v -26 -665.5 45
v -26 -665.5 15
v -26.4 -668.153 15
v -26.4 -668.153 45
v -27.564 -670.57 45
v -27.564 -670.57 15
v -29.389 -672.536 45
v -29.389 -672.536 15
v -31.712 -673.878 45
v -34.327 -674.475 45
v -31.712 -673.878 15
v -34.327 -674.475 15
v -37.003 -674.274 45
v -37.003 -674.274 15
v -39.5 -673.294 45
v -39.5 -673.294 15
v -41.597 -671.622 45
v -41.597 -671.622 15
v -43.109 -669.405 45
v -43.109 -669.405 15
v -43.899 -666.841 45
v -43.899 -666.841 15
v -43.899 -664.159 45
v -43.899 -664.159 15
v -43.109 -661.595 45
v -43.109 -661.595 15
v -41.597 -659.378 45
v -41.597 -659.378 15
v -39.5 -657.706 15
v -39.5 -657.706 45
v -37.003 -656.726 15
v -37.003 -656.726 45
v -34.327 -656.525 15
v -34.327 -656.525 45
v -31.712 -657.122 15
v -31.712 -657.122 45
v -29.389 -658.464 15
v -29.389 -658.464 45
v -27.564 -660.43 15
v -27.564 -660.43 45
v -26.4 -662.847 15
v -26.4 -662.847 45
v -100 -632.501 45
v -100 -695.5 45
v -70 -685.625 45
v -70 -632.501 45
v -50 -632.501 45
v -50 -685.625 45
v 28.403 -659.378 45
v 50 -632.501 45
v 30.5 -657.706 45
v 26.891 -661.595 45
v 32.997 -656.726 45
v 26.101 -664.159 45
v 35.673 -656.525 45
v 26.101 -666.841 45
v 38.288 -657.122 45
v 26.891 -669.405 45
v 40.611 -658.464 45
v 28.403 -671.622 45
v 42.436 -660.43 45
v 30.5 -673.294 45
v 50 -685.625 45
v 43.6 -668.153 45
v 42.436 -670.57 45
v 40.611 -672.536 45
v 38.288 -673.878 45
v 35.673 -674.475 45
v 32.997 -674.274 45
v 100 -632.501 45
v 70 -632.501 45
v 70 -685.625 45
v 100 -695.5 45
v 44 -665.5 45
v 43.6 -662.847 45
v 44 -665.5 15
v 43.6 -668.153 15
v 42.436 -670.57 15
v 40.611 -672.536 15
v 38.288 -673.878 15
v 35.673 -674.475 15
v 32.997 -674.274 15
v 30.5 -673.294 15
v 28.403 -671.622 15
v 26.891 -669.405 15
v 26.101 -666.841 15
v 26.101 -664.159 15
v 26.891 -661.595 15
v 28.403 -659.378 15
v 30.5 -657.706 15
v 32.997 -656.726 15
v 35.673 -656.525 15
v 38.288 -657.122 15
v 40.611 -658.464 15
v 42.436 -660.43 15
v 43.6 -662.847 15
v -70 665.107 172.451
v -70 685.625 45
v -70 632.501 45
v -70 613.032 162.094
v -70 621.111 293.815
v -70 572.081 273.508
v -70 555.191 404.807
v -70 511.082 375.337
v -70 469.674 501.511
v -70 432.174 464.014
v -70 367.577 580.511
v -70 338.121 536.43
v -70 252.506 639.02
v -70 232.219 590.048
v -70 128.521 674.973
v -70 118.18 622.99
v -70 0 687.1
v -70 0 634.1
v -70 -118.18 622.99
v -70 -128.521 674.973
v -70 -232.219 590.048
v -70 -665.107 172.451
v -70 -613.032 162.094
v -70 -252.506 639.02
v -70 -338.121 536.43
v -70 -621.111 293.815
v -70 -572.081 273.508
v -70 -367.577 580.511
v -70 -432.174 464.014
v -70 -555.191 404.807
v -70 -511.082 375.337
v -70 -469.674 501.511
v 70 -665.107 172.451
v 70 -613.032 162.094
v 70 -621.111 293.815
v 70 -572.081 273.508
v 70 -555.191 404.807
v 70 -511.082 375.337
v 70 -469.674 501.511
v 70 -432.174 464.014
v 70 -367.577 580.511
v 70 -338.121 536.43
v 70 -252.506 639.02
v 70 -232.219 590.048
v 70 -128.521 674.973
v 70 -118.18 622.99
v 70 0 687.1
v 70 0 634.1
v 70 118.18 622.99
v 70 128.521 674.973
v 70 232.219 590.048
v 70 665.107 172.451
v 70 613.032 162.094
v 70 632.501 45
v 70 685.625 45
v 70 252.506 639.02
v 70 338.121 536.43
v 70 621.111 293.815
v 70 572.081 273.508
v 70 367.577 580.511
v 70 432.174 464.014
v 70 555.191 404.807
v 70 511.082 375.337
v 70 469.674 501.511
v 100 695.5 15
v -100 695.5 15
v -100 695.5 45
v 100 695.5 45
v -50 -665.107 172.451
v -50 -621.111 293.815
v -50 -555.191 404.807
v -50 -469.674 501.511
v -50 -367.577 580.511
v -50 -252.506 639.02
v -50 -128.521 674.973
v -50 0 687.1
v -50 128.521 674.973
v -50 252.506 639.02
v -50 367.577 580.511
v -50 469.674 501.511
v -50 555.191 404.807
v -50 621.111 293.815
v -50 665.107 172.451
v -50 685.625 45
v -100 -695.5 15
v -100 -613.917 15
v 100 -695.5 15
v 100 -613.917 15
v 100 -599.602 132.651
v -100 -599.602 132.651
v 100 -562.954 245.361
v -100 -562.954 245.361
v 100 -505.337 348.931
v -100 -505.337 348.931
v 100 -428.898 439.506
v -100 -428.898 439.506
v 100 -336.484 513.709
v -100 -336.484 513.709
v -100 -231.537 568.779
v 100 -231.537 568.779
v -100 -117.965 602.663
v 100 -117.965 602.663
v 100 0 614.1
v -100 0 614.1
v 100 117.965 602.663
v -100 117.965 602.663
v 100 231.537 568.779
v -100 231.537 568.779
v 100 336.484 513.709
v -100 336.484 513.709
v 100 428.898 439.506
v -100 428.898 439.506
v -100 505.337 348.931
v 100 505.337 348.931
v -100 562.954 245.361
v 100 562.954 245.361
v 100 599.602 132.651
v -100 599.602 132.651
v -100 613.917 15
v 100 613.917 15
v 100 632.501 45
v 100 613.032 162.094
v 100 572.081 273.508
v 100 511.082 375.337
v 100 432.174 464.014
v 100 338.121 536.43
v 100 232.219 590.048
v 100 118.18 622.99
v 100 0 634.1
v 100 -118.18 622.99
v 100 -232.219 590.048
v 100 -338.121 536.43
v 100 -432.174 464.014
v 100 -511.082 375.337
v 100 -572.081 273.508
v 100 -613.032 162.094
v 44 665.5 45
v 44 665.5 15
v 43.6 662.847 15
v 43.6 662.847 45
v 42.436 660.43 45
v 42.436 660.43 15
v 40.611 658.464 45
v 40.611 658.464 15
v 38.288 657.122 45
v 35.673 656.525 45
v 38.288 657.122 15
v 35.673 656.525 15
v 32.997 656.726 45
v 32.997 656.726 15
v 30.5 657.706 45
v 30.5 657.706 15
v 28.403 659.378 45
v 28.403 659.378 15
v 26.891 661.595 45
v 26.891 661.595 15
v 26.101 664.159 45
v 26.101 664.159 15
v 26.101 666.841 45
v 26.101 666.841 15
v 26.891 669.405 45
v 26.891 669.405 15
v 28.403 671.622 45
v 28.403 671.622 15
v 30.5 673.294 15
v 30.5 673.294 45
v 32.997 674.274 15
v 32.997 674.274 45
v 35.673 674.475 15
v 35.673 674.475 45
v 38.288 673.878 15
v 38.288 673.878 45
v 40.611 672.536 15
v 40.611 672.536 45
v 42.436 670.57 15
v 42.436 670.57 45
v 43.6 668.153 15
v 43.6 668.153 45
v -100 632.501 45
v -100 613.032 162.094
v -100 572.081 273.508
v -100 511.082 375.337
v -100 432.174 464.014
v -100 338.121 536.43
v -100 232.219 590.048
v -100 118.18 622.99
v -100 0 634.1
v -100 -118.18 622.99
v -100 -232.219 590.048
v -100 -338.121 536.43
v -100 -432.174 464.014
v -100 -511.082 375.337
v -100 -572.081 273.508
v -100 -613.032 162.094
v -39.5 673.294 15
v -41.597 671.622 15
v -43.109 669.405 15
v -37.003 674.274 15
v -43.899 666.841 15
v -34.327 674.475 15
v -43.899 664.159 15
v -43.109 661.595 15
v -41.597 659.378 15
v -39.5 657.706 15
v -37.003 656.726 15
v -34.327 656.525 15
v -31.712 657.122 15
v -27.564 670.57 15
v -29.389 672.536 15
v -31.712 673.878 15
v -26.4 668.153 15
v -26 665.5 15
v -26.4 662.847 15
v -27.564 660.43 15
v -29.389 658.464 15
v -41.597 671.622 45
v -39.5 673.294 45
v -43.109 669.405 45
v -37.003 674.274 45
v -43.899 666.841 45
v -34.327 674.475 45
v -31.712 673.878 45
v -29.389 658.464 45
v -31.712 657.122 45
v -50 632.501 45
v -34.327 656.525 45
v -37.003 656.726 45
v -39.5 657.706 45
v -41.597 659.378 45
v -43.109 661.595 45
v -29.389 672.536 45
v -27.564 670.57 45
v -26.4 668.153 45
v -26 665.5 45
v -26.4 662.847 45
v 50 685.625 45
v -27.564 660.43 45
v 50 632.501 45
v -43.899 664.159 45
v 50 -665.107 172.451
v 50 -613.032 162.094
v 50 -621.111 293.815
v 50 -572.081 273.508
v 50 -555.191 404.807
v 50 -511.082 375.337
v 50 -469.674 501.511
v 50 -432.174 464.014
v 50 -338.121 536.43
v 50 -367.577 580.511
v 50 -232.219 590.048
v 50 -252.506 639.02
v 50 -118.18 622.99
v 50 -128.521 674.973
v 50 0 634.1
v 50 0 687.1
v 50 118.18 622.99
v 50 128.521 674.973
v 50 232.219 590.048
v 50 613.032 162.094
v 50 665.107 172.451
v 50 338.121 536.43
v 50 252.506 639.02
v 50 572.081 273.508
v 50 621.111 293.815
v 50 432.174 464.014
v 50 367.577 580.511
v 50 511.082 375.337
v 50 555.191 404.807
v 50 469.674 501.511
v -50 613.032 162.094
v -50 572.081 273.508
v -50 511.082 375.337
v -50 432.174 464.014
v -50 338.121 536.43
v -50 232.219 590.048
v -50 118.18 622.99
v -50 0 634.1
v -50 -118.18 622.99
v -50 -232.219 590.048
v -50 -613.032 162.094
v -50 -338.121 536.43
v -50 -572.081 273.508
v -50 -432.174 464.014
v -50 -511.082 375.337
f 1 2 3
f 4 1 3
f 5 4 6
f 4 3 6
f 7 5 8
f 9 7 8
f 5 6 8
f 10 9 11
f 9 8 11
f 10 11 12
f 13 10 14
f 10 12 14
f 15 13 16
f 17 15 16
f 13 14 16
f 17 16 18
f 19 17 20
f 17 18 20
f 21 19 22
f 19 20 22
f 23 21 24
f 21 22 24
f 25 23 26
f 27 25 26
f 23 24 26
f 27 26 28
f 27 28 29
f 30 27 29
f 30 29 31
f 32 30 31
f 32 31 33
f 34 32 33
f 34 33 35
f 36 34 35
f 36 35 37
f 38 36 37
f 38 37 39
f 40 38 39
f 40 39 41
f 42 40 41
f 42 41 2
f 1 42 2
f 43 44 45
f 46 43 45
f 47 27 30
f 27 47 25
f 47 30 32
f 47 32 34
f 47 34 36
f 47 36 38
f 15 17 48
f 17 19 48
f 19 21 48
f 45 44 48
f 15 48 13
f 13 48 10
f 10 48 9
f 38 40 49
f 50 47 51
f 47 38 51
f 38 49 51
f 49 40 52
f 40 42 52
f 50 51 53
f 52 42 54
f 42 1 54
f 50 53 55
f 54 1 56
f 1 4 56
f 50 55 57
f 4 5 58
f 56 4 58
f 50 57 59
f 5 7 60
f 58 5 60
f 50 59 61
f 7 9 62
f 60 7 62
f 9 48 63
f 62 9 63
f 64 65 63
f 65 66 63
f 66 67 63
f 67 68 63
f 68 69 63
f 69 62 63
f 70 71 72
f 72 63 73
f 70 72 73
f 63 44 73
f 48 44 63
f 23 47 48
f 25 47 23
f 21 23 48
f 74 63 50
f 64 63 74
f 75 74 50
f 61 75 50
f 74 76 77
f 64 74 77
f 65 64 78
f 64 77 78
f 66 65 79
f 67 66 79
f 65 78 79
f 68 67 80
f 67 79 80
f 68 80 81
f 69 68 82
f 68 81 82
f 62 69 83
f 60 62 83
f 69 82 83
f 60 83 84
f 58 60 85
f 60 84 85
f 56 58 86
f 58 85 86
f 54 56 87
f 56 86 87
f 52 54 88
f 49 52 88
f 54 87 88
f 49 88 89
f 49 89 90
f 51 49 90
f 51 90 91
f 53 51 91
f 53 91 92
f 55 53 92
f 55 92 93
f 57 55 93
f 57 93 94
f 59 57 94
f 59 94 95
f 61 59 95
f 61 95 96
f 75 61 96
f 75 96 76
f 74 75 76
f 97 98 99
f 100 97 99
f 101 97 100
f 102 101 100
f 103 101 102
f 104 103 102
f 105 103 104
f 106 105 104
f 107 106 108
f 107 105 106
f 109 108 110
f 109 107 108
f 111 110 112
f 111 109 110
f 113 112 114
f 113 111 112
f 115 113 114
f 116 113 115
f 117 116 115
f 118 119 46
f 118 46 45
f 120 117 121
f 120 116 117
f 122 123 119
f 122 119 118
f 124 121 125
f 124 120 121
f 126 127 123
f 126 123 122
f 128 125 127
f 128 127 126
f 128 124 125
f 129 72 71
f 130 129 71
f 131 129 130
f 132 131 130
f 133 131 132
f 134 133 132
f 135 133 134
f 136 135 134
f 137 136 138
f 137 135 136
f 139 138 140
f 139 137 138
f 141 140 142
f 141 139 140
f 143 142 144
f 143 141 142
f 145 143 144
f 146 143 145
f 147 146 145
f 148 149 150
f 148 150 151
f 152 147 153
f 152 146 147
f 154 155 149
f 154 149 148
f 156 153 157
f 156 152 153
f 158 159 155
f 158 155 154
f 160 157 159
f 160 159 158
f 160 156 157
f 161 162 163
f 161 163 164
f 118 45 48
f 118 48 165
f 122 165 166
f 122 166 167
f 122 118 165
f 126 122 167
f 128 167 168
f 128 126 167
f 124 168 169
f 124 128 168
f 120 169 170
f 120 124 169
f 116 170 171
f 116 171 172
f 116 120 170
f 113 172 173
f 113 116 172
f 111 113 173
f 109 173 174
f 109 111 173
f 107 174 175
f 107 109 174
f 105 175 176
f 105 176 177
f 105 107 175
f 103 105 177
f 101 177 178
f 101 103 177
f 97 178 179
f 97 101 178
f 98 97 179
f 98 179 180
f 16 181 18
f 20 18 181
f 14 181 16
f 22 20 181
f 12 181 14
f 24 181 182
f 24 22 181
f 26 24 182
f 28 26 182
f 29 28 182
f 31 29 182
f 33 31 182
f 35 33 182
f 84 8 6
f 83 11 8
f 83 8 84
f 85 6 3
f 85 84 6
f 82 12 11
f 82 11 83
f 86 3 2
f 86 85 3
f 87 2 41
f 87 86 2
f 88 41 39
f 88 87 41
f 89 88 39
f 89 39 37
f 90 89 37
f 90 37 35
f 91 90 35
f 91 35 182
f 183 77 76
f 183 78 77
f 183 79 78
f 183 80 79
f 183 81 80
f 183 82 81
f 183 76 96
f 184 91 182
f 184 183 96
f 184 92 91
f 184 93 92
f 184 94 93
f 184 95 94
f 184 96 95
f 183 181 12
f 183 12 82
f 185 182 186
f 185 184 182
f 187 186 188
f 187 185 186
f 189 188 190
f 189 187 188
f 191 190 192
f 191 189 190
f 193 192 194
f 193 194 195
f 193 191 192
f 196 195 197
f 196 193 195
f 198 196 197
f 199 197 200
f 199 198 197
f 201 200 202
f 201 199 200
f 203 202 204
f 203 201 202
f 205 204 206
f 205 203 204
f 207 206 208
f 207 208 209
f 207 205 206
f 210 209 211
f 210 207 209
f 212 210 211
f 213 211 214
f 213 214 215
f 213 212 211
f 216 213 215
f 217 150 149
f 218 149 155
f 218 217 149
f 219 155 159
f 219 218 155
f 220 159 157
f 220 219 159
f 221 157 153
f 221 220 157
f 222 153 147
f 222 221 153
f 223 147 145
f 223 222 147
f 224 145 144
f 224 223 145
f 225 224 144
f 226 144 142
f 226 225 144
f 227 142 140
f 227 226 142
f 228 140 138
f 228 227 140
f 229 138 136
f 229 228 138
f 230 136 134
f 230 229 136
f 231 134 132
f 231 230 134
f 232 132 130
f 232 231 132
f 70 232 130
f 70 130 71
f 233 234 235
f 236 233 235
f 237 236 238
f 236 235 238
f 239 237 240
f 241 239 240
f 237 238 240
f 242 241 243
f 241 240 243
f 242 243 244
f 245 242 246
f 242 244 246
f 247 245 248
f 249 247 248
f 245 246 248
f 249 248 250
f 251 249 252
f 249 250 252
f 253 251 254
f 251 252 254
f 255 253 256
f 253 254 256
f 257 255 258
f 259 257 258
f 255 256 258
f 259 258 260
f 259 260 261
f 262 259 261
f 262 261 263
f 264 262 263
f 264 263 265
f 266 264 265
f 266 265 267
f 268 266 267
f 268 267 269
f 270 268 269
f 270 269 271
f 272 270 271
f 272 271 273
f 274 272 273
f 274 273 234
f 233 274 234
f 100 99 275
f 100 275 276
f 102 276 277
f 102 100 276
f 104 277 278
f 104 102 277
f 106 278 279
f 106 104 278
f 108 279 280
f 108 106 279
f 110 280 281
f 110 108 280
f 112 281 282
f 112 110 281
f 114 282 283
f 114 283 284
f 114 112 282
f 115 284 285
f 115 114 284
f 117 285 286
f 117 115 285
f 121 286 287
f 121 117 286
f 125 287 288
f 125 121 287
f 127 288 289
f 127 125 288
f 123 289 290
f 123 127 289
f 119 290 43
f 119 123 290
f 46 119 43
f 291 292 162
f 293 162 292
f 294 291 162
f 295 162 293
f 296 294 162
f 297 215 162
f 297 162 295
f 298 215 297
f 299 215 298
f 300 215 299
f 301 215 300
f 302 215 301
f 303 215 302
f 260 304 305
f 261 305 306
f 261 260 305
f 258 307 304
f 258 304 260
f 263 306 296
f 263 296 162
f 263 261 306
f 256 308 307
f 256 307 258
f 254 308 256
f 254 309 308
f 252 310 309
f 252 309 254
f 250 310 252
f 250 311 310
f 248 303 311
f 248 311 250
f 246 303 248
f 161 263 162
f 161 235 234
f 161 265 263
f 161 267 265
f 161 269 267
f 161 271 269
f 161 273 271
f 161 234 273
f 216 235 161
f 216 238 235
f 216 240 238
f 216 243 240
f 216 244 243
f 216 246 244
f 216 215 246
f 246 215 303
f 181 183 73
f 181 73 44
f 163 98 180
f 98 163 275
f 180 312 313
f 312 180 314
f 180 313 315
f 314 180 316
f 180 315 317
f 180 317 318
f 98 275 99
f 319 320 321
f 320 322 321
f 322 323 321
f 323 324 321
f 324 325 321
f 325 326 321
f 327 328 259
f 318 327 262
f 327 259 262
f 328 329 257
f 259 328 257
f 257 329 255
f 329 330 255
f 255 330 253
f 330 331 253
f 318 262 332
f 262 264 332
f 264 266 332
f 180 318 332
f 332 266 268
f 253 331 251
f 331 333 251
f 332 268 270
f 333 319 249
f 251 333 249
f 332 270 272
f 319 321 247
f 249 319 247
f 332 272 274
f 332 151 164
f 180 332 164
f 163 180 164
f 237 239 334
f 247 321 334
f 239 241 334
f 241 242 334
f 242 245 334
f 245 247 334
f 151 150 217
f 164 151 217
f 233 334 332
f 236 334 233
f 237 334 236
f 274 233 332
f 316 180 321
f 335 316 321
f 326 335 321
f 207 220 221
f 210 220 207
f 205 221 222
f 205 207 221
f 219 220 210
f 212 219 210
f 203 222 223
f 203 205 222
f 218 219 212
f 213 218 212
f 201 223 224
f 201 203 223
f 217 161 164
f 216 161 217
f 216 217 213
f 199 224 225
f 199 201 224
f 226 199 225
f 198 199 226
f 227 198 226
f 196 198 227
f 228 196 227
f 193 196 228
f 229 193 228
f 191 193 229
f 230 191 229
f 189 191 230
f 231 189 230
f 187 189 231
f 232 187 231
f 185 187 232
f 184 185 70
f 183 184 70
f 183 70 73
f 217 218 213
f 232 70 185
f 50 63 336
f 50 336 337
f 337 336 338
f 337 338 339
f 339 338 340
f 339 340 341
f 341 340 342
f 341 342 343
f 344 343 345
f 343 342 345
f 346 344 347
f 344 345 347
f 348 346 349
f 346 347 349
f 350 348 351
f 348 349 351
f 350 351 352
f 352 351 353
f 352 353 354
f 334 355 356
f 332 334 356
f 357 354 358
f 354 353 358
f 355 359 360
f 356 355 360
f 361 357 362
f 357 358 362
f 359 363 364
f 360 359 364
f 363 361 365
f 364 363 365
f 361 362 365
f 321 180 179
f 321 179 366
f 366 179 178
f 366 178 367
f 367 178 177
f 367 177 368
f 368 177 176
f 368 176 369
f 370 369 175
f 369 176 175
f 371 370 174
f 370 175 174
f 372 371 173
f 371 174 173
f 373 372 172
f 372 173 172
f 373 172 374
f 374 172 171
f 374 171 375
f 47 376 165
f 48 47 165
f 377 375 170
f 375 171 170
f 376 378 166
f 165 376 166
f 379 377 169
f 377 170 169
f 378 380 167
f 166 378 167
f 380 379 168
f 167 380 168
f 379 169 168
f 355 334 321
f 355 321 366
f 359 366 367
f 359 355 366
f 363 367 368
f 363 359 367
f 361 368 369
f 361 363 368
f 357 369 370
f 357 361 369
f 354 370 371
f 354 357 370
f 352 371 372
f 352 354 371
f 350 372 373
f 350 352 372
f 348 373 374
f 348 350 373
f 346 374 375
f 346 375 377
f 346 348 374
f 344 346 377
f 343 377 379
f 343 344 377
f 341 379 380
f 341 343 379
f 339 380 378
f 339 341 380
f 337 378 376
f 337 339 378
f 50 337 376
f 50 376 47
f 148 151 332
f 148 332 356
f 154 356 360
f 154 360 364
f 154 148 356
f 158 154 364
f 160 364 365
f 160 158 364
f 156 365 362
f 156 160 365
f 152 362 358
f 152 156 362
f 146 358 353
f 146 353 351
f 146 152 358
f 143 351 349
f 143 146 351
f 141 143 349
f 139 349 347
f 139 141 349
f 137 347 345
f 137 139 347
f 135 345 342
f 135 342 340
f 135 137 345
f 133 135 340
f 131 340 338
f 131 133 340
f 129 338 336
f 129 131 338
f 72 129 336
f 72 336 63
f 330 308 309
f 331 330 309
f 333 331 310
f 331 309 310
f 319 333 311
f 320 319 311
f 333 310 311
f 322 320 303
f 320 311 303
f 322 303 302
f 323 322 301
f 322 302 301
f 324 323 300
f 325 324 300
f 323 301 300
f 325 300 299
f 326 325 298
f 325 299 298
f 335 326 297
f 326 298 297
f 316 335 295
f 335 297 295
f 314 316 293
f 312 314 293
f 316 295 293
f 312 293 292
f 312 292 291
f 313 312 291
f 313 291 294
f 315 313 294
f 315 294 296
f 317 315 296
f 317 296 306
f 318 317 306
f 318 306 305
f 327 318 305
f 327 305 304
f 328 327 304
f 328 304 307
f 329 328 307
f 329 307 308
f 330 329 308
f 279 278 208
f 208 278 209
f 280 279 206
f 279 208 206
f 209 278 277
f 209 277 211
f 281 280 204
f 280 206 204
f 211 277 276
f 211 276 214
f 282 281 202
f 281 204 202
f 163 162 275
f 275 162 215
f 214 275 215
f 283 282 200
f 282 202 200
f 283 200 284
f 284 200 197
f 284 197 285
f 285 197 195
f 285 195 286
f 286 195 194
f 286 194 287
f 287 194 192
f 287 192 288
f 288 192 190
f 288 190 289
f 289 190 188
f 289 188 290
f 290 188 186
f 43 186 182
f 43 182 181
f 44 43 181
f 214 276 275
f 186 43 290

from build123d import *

# Parameters (mm, degrees)
F1_DEPTH  = 100
F4_DEPTH  = 20
F7_DEPTH  = 20
F8_W      = 200
F8_H      = 81.5832222524
F9_DEPTH  = 30
F10_R     = 9
F11_DEPTH = 672.101


with BuildPart() as f1:
    # F0 (on Right) → F1 (new body, symmetric)
    with BuildSketch(Plane.YZ):
        with BuildLine():
            ThreePointArc((-613.9167777476, 15), (0, 614.1), (613.9167777476, 15))
            Line((613.9167777476, 15), (633.9225583618, 15))
            ThreePointArc((633.9225583618, 15), (0, 634.1), (-633.9225583618, 15))
            Line((-633.9225583618, 15), (-613.9167777476, 15))
        make_face()
    extrude(amount=F1_DEPTH, both=True)

    # F3 (on offset) → F4 (join)
    with BuildSketch(Plane.YZ.offset(70)):
        with BuildLine():
            ThreePointArc((-633.9225583618, 15), (0, 634.1), (633.9225583618, 15))
            Line((633.9225583618, 15), (686.9362488616, 15))
            ThreePointArc((686.9362488616, 15), (0, 687.1), (-686.9362488616, 15))
            Line((-686.9362488616, 15), (-633.9225583618, 15))
        make_face()
    extrude(amount=-F4_DEPTH)

    # F6 (on offset) → F7 (join)
    with BuildSketch(Plane(origin=(-70, 0, 0), x_dir=(0, -1, 0), z_dir=(-1, 0, 0))):
        with BuildLine():
            Line((-686.9362488616, 15), (-633.9225583618, 15))
            ThreePointArc((-633.9225583618, 15), (0, 634.1), (633.9225583618, 15))
            Line((633.9225583618, 15), (686.9362488616, 15))
            ThreePointArc((686.9362488616, 15), (0, 687.1), (-686.9362488616, 15))
        make_face()
    extrude(amount=-F7_DEPTH)

    # F8 (on face) → F9 (join)
    with BuildSketch(Plane(origin=(0, 0, 15), x_dir=(1, 0, 0), z_dir=(0, 0, -1))):
        with Locations((0, -654.7083888738)):
            Rectangle(F8_W, F8_H)
        Polygon((-100, 695.5), (-100, 633.9225583618), (-70, 633.9225583618), (-70, 686.9362488616), (-50, 686.9362488616), (-50, 633.9225583618), (50, 633.9225583618), (50, 686.9362488616), (70, 686.9362488616), (70, 633.9225583618), (100, 633.9225583618), (100, 695.5), align=None)
        Polygon((-100, 633.9225583618), (-100, 613.9167777476), (100, 613.9167777476), (100, 633.9225583618), (70, 633.9225583618), (70, 686.9362488616), (50, 686.9362488616), (50, 633.9225583618), (-50, 633.9225583618), (-50, 686.9362488616), (-70, 686.9362488616), (-70, 633.9225583618), align=None)
    extrude(amount=-F9_DEPTH)

    # F10 (on face) → F11 (cut, through all)
    with BuildSketch(Plane(origin=(0, 0, 15), x_dir=(1, 0, 0), z_dir=(0, 0, -1))):
        with Locations((-35, 665.5)):
            Circle(F10_R)
        with Locations((35, 665.5)):
            Circle(F10_R)
        with Locations((-35, -665.5)):
            Circle(F10_R)
        with Locations((35, -665.5)):
            Circle(F10_R)
    extrude(amount=-F11_DEPTH, mode=Mode.SUBTRACT)


solid = f1.part
